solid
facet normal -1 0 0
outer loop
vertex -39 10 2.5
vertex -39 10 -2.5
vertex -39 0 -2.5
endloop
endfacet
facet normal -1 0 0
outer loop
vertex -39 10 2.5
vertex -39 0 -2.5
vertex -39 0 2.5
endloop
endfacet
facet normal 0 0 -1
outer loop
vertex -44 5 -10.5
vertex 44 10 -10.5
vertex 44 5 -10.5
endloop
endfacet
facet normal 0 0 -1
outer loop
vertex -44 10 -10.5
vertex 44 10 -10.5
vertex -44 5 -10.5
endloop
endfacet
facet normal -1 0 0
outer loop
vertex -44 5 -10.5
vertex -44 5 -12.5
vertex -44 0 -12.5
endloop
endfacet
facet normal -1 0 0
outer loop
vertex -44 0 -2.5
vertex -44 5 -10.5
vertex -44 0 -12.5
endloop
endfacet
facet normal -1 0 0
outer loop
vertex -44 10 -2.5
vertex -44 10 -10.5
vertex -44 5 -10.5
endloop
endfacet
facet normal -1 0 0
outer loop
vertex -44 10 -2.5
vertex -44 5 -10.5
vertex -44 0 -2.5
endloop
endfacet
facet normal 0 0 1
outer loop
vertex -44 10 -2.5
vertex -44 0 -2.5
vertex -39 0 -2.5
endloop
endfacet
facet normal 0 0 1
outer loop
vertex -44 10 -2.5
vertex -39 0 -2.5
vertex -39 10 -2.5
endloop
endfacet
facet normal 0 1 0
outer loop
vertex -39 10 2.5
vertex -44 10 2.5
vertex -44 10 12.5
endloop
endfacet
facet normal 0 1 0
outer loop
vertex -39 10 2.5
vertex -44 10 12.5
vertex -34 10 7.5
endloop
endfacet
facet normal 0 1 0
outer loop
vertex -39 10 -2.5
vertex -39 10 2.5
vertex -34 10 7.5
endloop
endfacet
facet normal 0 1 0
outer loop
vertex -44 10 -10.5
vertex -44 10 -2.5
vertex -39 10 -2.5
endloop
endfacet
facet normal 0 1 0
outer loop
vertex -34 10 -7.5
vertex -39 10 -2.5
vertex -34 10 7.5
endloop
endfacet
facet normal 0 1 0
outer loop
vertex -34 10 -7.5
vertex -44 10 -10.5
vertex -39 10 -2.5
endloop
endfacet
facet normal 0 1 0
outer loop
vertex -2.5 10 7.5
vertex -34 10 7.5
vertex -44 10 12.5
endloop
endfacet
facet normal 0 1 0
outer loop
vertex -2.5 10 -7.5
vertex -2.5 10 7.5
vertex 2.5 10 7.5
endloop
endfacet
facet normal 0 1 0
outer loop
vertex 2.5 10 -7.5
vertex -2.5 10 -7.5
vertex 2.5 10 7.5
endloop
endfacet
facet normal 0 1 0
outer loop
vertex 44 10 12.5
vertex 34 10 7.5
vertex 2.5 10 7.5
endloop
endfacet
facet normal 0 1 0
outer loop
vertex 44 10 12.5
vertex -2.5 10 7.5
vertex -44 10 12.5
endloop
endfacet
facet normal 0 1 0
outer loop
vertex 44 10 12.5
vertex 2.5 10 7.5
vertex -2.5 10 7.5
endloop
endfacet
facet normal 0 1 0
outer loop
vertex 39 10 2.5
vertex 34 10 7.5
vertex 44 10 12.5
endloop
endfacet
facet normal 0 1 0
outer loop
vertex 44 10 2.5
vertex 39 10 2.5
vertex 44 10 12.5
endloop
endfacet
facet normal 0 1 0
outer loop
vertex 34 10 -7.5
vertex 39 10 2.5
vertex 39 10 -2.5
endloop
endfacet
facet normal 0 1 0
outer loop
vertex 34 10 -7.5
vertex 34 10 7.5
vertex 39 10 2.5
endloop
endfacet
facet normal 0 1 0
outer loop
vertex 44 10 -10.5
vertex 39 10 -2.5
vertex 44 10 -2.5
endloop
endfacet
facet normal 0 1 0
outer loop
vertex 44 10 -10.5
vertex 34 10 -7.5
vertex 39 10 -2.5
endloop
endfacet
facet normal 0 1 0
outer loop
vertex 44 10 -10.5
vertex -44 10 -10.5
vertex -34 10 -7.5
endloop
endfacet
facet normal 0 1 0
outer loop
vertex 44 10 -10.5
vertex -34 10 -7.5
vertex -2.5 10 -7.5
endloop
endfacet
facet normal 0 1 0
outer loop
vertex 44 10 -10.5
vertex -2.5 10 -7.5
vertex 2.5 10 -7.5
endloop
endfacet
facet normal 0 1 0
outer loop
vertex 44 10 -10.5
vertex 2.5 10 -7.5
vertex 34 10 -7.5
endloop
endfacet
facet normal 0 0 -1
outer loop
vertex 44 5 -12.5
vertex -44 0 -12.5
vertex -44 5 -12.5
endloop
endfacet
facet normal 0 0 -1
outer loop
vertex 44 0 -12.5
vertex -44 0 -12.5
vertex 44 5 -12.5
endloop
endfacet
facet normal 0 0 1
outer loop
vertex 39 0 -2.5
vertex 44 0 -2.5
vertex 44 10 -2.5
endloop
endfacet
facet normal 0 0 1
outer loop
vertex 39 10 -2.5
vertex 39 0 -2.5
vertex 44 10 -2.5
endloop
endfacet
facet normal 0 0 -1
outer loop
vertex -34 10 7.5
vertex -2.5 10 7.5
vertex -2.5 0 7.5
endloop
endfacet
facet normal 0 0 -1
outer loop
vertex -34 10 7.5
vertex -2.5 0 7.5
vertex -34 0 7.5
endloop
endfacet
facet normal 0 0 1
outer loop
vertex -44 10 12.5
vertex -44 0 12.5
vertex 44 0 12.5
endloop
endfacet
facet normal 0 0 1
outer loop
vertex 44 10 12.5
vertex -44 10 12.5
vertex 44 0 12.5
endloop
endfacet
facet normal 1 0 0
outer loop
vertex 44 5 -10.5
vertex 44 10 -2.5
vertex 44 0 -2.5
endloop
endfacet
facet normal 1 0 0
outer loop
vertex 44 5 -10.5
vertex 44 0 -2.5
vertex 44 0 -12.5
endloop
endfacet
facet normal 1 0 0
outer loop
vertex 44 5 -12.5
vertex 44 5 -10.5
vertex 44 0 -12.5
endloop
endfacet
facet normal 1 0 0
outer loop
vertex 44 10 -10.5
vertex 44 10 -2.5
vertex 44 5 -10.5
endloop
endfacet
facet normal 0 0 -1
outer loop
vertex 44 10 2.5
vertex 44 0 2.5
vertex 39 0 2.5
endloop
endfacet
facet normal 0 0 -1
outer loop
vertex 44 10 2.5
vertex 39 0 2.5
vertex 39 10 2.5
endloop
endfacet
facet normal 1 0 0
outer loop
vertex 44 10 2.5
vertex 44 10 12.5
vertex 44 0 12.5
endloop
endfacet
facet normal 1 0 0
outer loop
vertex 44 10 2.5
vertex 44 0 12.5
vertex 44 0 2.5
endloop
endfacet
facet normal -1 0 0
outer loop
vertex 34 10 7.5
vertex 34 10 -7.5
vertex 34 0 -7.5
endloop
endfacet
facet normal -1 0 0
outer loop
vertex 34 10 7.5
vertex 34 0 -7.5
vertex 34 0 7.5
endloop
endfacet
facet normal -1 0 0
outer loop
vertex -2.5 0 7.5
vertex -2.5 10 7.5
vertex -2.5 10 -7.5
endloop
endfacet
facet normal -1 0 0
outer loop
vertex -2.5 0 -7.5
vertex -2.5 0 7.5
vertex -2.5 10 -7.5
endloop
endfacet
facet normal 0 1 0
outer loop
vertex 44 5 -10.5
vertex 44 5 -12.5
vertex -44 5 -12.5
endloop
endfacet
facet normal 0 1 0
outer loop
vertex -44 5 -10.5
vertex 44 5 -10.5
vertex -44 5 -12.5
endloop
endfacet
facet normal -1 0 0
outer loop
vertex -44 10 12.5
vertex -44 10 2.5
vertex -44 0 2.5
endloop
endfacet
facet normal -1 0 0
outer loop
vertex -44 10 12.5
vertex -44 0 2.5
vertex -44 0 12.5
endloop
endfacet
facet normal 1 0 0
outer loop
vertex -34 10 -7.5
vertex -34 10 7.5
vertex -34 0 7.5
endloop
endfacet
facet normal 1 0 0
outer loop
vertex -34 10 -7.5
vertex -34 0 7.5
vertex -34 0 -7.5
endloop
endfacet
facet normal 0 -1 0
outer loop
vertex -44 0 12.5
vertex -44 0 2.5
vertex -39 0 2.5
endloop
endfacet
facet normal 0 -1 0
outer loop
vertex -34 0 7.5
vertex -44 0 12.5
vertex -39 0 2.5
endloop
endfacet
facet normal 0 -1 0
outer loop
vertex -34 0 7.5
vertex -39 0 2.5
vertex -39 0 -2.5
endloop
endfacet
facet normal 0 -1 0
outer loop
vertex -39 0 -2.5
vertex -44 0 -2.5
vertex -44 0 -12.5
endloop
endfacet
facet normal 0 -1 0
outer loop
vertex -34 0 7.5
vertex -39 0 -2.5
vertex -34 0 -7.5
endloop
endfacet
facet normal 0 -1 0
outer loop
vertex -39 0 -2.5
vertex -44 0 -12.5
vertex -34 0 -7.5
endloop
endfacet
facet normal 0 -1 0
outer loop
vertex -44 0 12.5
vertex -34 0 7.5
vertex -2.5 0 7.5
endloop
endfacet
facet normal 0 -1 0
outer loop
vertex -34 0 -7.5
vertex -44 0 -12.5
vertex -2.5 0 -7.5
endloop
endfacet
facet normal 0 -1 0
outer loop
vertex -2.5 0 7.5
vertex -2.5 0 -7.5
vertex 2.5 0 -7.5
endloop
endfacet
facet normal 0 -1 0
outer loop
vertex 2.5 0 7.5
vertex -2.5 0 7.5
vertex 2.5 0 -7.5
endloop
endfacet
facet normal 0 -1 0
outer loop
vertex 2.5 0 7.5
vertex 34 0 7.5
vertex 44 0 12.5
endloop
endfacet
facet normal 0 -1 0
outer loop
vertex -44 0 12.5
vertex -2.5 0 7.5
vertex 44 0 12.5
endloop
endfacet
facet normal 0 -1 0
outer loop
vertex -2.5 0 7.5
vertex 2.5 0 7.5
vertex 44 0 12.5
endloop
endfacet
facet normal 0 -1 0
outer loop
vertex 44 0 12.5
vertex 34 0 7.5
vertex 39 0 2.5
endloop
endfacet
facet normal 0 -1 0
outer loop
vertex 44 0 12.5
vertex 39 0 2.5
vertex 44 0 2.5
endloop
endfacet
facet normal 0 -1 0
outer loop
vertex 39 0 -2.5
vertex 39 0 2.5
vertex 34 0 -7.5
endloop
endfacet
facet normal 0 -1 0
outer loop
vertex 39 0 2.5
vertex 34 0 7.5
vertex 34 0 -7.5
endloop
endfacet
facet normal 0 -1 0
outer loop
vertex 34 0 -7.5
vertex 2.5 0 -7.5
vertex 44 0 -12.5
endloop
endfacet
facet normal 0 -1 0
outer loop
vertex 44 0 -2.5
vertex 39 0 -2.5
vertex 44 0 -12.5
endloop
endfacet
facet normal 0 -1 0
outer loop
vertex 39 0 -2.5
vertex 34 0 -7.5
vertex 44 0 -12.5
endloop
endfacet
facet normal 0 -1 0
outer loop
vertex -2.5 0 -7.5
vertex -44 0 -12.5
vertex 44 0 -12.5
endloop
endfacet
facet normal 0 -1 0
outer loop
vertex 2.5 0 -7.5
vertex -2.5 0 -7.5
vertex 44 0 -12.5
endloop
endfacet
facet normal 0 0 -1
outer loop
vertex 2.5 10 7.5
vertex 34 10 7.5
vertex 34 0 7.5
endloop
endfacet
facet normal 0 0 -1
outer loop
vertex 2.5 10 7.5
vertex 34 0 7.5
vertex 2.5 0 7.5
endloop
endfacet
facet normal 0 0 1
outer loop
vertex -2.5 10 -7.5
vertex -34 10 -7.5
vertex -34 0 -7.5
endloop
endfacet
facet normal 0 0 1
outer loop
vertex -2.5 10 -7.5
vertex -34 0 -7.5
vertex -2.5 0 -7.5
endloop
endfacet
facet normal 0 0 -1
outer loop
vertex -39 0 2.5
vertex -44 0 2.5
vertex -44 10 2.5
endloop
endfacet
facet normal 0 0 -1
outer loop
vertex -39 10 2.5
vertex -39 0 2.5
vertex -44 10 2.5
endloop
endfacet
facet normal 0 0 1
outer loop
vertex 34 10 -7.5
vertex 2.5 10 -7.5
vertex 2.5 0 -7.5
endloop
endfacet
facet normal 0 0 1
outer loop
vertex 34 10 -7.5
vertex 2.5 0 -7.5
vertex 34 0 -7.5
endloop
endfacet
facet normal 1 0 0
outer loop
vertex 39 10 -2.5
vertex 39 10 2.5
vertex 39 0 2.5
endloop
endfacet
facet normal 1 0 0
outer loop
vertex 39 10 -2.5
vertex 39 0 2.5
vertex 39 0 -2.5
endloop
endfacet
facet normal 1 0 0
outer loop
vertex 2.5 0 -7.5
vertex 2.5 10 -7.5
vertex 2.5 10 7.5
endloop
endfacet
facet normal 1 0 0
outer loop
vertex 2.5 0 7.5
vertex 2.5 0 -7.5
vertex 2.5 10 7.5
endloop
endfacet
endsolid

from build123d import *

# Parameters (mm, degrees)
SKETCH1_W           = 98
SKETCH1_H           = 25
BOSS_EXTRUDE1_DEPTH = 10
CUT_EXTRUDE4_DEPTH  = 10
SKETCH4_W           = 25
SKETCH4_H           = 10
CUT_EXTRUDE6_DEPTH  = 5
SKETCH5_W           = 25
SKETCH5_H           = 10
CUT_EXTRUDE7_DEPTH  = 5
SKETCH6_W           = 5
SKETCH6_H           = 10
CUT_EXTRUDE8_DEPTH  = 5
SKETCH7_W           = 5
SKETCH7_H           = 10
CUT_EXTRUDE9_DEPTH  = 5
SKETCH8_W           = 88
SKETCH8_H           = 5
CUT_EXTRUDE10_DEPTH = 2


with BuildPart() as part:
    # Sketch1 → Boss-Extrude1 (new body)
    with BuildSketch(Plane(origin=(0, 0, 0), x_dir=(1, 0, 0), z_dir=(0, 1, 0))):
        Rectangle(SKETCH1_W, SKETCH1_H)
    extrude(amount=BOSS_EXTRUDE1_DEPTH)

    # Sketch2 → Cut-Extrude4 (cut)
    with BuildSketch(Plane(origin=(0, 10, 0), x_dir=(1, 0, 0), z_dir=(0, 1, 0))):
        Polygon((-2.5, 2.403992328), (-2.5, -7.5), (-34, -7.5), (-34, 7.5), (-2.5, 7.5), align=None)
        Polygon((2.5, 2.403992328), (2.5, 7.5), (34, 7.5), (34, -7.5), (2.5, -7.5), align=None)
    extrude(amount=-CUT_EXTRUDE4_DEPTH, mode=Mode.SUBTRACT)

    # Sketch4 → Cut-Extrude6 (cut)
    with BuildSketch(Plane.ZY.offset(49)):
        with Locations((0, 5)):
            Rectangle(SKETCH4_W, SKETCH4_H)
    extrude(amount=-CUT_EXTRUDE6_DEPTH, mode=Mode.SUBTRACT)

    # Sketch5 → Cut-Extrude7 (cut)
    with BuildSketch(Plane(origin=(49, 0, 0), x_dir=(0, 0, -1), z_dir=(1, 0, 0))):
        with Locations((0, 5)):
            Rectangle(SKETCH5_W, SKETCH5_H)
    extrude(amount=-CUT_EXTRUDE7_DEPTH, mode=Mode.SUBTRACT)

    # Sketch6 → Cut-Extrude8 (cut)
    with BuildSketch(Plane(origin=(44, 0, 0), x_dir=(0, 0, -1), z_dir=(1, 0, 0))):
        with Locations((0, 5)):
            Rectangle(SKETCH6_W, SKETCH6_H)
    extrude(amount=-CUT_EXTRUDE8_DEPTH, mode=Mode.SUBTRACT)

    # Sketch7 → Cut-Extrude9 (cut)
    with BuildSketch(Plane.ZY.offset(44)):
        with Locations((0, 5)):
            Rectangle(SKETCH7_W, SKETCH7_H)
    extrude(amount=-CUT_EXTRUDE9_DEPTH, mode=Mode.SUBTRACT)

    # Sketch8 → Cut-Extrude10 (cut)
    with BuildSketch(Plane(origin=(0, 0, -12.5), x_dir=(-1, 0, 0), z_dir=(0, 0, -1))):
        with Locations((0, 7.5)):
            Rectangle(SKETCH8_W, SKETCH8_H)
    extrude(amount=-CUT_EXTRUDE10_DEPTH, mode=Mode.SUBTRACT)


solid = part.part
